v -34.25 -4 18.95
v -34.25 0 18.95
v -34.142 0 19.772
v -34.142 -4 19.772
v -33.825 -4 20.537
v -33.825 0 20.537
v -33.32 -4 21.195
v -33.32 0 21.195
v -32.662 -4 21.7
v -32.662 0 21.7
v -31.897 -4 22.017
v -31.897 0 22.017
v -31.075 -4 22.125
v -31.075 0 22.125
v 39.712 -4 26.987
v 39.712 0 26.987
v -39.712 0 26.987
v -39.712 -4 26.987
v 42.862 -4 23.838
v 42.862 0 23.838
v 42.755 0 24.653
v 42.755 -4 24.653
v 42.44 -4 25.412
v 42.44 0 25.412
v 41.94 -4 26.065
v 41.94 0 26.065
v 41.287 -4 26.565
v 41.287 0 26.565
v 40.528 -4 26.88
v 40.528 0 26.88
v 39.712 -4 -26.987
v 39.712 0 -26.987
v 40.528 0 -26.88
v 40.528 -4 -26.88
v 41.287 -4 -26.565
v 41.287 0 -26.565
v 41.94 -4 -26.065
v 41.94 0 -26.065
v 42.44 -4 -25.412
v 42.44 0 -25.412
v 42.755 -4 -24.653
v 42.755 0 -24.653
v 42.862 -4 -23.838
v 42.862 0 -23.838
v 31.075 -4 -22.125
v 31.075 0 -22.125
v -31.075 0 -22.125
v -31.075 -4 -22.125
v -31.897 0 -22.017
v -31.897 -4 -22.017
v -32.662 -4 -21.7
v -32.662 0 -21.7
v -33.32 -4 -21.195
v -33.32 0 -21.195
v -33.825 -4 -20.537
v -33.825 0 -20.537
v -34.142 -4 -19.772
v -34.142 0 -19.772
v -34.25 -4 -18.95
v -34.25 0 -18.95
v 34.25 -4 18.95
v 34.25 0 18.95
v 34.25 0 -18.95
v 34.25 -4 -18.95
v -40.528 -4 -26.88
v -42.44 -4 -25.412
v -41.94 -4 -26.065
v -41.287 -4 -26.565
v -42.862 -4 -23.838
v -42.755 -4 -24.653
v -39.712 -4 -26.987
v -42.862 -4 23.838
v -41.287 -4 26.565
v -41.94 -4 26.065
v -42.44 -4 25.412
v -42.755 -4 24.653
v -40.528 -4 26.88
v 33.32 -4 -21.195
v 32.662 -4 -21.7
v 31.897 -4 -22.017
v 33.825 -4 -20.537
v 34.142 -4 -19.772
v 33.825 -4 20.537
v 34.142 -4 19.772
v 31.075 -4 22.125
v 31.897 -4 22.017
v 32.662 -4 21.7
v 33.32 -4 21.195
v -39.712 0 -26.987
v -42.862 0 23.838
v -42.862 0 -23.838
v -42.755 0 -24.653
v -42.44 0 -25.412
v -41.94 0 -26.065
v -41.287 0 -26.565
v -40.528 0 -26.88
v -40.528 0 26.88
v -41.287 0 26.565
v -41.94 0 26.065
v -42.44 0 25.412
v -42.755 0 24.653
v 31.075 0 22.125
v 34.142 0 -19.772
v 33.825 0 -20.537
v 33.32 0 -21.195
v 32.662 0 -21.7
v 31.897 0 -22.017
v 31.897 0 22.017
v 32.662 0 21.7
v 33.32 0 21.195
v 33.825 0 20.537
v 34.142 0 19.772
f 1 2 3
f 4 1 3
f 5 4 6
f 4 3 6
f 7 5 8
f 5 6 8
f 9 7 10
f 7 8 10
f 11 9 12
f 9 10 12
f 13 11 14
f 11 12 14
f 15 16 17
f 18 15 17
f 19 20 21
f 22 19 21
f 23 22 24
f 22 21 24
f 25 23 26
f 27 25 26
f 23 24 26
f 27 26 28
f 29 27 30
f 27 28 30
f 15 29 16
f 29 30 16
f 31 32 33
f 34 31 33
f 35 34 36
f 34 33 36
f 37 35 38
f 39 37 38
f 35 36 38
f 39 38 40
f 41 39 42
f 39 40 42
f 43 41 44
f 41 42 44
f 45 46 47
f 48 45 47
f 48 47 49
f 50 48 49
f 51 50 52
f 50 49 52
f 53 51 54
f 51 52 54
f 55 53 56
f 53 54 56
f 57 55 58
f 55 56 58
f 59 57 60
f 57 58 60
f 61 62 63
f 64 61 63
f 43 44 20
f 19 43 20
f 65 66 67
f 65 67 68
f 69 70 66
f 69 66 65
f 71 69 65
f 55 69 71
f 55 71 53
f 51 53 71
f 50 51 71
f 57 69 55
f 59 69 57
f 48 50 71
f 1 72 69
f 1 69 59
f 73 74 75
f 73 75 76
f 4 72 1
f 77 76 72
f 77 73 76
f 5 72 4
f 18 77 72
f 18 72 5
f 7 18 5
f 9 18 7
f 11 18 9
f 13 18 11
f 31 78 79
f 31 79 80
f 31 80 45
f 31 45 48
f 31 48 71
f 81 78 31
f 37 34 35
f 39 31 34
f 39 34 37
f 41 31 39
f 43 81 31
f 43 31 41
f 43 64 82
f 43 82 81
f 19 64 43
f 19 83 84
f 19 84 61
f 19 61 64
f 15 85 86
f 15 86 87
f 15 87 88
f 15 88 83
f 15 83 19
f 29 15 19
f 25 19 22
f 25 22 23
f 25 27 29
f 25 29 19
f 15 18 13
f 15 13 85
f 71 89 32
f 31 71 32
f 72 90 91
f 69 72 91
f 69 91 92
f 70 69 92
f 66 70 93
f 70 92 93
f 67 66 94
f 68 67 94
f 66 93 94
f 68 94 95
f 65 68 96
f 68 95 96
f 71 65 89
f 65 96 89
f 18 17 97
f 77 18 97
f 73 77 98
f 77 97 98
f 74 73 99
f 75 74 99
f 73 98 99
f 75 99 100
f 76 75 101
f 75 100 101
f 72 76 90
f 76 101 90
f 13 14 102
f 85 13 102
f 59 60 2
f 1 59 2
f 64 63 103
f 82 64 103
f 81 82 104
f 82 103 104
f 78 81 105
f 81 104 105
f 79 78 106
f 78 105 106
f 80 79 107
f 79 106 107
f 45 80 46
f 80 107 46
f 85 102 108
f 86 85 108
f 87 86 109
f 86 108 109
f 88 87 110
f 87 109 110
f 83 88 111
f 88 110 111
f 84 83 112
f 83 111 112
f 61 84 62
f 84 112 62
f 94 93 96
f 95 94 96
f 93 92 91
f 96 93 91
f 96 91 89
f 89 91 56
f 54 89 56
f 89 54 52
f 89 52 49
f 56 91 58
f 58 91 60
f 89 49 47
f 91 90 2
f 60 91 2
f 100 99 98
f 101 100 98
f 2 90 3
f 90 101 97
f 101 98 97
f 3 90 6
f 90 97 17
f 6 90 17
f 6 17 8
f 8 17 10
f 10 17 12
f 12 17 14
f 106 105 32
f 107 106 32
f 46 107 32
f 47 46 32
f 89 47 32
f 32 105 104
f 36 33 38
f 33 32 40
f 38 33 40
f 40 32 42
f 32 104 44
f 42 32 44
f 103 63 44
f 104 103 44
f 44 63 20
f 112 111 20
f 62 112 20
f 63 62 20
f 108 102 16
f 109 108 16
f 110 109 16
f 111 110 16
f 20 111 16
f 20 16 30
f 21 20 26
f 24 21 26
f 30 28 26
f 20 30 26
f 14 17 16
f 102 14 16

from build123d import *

# Parameters (mm, degrees)
F1_DEPTH = 4


with BuildPart() as f1:
    # F0 (on Front) → F1 (new body)
    with BuildSketch(Plane.XZ):
        with BuildLine():
            Line((0, 26.9875), (-39.7125, 26.9875))
            ThreePointArc((-39.7125, 26.9875), (-41.939886, 26.064886), (-42.8625, 23.8375))
            Line((-42.8625, 23.8375), (-42.8625, 0))
            Line((-42.8625, 0), (-34.25, 0))
            Line((-34.25, 0), (-34.25, 18.95))
            ThreePointArc((-34.25, 18.95), (-33.320064, 21.195064), (-31.075, 22.125))
            Line((-31.075, 22.125), (0, 22.125))
            Line((0, 22.125), (0, 26.9875))
        make_face()
        with BuildLine():
            Line((39.7125, 26.9875), (0, 26.9875))
            Line((0, 26.9875), (0, 22.125))
            Line((0, 22.125), (31.075, 22.125))
            ThreePointArc((31.075, 22.125), (33.320064, 21.195064), (34.25, 18.95))
            Line((34.25, 18.95), (34.25, -18.95))
            ThreePointArc((34.25, -18.95), (33.320064, -21.195064), (31.075, -22.125))
            Line((31.075, -22.125), (-31.075, -22.125))
            ThreePointArc((-31.075, -22.125), (-33.320064, -21.195064), (-34.25, -18.95))
            Line((-34.25, -18.95), (-34.25, 0))
            Line((-34.25, 0), (-42.8625, 0))
            Line((-42.8625, 0), (-42.8625, -23.8375))
            ThreePointArc((-42.8625, -23.8375), (-41.939886, -26.064886), (-39.7125, -26.9875))
            Line((-39.7125, -26.9875), (39.7125, -26.9875))
            ThreePointArc((39.7125, -26.9875), (41.939886, -26.064886), (42.8625, -23.8375))
            Line((42.8625, -23.8375), (42.8625, 23.8375))
            ThreePointArc((42.8625, 23.8375), (41.939886, 26.064886), (39.7125, 26.9875))
        make_face()
    extrude(amount=F1_DEPTH)


solid = f1.part
